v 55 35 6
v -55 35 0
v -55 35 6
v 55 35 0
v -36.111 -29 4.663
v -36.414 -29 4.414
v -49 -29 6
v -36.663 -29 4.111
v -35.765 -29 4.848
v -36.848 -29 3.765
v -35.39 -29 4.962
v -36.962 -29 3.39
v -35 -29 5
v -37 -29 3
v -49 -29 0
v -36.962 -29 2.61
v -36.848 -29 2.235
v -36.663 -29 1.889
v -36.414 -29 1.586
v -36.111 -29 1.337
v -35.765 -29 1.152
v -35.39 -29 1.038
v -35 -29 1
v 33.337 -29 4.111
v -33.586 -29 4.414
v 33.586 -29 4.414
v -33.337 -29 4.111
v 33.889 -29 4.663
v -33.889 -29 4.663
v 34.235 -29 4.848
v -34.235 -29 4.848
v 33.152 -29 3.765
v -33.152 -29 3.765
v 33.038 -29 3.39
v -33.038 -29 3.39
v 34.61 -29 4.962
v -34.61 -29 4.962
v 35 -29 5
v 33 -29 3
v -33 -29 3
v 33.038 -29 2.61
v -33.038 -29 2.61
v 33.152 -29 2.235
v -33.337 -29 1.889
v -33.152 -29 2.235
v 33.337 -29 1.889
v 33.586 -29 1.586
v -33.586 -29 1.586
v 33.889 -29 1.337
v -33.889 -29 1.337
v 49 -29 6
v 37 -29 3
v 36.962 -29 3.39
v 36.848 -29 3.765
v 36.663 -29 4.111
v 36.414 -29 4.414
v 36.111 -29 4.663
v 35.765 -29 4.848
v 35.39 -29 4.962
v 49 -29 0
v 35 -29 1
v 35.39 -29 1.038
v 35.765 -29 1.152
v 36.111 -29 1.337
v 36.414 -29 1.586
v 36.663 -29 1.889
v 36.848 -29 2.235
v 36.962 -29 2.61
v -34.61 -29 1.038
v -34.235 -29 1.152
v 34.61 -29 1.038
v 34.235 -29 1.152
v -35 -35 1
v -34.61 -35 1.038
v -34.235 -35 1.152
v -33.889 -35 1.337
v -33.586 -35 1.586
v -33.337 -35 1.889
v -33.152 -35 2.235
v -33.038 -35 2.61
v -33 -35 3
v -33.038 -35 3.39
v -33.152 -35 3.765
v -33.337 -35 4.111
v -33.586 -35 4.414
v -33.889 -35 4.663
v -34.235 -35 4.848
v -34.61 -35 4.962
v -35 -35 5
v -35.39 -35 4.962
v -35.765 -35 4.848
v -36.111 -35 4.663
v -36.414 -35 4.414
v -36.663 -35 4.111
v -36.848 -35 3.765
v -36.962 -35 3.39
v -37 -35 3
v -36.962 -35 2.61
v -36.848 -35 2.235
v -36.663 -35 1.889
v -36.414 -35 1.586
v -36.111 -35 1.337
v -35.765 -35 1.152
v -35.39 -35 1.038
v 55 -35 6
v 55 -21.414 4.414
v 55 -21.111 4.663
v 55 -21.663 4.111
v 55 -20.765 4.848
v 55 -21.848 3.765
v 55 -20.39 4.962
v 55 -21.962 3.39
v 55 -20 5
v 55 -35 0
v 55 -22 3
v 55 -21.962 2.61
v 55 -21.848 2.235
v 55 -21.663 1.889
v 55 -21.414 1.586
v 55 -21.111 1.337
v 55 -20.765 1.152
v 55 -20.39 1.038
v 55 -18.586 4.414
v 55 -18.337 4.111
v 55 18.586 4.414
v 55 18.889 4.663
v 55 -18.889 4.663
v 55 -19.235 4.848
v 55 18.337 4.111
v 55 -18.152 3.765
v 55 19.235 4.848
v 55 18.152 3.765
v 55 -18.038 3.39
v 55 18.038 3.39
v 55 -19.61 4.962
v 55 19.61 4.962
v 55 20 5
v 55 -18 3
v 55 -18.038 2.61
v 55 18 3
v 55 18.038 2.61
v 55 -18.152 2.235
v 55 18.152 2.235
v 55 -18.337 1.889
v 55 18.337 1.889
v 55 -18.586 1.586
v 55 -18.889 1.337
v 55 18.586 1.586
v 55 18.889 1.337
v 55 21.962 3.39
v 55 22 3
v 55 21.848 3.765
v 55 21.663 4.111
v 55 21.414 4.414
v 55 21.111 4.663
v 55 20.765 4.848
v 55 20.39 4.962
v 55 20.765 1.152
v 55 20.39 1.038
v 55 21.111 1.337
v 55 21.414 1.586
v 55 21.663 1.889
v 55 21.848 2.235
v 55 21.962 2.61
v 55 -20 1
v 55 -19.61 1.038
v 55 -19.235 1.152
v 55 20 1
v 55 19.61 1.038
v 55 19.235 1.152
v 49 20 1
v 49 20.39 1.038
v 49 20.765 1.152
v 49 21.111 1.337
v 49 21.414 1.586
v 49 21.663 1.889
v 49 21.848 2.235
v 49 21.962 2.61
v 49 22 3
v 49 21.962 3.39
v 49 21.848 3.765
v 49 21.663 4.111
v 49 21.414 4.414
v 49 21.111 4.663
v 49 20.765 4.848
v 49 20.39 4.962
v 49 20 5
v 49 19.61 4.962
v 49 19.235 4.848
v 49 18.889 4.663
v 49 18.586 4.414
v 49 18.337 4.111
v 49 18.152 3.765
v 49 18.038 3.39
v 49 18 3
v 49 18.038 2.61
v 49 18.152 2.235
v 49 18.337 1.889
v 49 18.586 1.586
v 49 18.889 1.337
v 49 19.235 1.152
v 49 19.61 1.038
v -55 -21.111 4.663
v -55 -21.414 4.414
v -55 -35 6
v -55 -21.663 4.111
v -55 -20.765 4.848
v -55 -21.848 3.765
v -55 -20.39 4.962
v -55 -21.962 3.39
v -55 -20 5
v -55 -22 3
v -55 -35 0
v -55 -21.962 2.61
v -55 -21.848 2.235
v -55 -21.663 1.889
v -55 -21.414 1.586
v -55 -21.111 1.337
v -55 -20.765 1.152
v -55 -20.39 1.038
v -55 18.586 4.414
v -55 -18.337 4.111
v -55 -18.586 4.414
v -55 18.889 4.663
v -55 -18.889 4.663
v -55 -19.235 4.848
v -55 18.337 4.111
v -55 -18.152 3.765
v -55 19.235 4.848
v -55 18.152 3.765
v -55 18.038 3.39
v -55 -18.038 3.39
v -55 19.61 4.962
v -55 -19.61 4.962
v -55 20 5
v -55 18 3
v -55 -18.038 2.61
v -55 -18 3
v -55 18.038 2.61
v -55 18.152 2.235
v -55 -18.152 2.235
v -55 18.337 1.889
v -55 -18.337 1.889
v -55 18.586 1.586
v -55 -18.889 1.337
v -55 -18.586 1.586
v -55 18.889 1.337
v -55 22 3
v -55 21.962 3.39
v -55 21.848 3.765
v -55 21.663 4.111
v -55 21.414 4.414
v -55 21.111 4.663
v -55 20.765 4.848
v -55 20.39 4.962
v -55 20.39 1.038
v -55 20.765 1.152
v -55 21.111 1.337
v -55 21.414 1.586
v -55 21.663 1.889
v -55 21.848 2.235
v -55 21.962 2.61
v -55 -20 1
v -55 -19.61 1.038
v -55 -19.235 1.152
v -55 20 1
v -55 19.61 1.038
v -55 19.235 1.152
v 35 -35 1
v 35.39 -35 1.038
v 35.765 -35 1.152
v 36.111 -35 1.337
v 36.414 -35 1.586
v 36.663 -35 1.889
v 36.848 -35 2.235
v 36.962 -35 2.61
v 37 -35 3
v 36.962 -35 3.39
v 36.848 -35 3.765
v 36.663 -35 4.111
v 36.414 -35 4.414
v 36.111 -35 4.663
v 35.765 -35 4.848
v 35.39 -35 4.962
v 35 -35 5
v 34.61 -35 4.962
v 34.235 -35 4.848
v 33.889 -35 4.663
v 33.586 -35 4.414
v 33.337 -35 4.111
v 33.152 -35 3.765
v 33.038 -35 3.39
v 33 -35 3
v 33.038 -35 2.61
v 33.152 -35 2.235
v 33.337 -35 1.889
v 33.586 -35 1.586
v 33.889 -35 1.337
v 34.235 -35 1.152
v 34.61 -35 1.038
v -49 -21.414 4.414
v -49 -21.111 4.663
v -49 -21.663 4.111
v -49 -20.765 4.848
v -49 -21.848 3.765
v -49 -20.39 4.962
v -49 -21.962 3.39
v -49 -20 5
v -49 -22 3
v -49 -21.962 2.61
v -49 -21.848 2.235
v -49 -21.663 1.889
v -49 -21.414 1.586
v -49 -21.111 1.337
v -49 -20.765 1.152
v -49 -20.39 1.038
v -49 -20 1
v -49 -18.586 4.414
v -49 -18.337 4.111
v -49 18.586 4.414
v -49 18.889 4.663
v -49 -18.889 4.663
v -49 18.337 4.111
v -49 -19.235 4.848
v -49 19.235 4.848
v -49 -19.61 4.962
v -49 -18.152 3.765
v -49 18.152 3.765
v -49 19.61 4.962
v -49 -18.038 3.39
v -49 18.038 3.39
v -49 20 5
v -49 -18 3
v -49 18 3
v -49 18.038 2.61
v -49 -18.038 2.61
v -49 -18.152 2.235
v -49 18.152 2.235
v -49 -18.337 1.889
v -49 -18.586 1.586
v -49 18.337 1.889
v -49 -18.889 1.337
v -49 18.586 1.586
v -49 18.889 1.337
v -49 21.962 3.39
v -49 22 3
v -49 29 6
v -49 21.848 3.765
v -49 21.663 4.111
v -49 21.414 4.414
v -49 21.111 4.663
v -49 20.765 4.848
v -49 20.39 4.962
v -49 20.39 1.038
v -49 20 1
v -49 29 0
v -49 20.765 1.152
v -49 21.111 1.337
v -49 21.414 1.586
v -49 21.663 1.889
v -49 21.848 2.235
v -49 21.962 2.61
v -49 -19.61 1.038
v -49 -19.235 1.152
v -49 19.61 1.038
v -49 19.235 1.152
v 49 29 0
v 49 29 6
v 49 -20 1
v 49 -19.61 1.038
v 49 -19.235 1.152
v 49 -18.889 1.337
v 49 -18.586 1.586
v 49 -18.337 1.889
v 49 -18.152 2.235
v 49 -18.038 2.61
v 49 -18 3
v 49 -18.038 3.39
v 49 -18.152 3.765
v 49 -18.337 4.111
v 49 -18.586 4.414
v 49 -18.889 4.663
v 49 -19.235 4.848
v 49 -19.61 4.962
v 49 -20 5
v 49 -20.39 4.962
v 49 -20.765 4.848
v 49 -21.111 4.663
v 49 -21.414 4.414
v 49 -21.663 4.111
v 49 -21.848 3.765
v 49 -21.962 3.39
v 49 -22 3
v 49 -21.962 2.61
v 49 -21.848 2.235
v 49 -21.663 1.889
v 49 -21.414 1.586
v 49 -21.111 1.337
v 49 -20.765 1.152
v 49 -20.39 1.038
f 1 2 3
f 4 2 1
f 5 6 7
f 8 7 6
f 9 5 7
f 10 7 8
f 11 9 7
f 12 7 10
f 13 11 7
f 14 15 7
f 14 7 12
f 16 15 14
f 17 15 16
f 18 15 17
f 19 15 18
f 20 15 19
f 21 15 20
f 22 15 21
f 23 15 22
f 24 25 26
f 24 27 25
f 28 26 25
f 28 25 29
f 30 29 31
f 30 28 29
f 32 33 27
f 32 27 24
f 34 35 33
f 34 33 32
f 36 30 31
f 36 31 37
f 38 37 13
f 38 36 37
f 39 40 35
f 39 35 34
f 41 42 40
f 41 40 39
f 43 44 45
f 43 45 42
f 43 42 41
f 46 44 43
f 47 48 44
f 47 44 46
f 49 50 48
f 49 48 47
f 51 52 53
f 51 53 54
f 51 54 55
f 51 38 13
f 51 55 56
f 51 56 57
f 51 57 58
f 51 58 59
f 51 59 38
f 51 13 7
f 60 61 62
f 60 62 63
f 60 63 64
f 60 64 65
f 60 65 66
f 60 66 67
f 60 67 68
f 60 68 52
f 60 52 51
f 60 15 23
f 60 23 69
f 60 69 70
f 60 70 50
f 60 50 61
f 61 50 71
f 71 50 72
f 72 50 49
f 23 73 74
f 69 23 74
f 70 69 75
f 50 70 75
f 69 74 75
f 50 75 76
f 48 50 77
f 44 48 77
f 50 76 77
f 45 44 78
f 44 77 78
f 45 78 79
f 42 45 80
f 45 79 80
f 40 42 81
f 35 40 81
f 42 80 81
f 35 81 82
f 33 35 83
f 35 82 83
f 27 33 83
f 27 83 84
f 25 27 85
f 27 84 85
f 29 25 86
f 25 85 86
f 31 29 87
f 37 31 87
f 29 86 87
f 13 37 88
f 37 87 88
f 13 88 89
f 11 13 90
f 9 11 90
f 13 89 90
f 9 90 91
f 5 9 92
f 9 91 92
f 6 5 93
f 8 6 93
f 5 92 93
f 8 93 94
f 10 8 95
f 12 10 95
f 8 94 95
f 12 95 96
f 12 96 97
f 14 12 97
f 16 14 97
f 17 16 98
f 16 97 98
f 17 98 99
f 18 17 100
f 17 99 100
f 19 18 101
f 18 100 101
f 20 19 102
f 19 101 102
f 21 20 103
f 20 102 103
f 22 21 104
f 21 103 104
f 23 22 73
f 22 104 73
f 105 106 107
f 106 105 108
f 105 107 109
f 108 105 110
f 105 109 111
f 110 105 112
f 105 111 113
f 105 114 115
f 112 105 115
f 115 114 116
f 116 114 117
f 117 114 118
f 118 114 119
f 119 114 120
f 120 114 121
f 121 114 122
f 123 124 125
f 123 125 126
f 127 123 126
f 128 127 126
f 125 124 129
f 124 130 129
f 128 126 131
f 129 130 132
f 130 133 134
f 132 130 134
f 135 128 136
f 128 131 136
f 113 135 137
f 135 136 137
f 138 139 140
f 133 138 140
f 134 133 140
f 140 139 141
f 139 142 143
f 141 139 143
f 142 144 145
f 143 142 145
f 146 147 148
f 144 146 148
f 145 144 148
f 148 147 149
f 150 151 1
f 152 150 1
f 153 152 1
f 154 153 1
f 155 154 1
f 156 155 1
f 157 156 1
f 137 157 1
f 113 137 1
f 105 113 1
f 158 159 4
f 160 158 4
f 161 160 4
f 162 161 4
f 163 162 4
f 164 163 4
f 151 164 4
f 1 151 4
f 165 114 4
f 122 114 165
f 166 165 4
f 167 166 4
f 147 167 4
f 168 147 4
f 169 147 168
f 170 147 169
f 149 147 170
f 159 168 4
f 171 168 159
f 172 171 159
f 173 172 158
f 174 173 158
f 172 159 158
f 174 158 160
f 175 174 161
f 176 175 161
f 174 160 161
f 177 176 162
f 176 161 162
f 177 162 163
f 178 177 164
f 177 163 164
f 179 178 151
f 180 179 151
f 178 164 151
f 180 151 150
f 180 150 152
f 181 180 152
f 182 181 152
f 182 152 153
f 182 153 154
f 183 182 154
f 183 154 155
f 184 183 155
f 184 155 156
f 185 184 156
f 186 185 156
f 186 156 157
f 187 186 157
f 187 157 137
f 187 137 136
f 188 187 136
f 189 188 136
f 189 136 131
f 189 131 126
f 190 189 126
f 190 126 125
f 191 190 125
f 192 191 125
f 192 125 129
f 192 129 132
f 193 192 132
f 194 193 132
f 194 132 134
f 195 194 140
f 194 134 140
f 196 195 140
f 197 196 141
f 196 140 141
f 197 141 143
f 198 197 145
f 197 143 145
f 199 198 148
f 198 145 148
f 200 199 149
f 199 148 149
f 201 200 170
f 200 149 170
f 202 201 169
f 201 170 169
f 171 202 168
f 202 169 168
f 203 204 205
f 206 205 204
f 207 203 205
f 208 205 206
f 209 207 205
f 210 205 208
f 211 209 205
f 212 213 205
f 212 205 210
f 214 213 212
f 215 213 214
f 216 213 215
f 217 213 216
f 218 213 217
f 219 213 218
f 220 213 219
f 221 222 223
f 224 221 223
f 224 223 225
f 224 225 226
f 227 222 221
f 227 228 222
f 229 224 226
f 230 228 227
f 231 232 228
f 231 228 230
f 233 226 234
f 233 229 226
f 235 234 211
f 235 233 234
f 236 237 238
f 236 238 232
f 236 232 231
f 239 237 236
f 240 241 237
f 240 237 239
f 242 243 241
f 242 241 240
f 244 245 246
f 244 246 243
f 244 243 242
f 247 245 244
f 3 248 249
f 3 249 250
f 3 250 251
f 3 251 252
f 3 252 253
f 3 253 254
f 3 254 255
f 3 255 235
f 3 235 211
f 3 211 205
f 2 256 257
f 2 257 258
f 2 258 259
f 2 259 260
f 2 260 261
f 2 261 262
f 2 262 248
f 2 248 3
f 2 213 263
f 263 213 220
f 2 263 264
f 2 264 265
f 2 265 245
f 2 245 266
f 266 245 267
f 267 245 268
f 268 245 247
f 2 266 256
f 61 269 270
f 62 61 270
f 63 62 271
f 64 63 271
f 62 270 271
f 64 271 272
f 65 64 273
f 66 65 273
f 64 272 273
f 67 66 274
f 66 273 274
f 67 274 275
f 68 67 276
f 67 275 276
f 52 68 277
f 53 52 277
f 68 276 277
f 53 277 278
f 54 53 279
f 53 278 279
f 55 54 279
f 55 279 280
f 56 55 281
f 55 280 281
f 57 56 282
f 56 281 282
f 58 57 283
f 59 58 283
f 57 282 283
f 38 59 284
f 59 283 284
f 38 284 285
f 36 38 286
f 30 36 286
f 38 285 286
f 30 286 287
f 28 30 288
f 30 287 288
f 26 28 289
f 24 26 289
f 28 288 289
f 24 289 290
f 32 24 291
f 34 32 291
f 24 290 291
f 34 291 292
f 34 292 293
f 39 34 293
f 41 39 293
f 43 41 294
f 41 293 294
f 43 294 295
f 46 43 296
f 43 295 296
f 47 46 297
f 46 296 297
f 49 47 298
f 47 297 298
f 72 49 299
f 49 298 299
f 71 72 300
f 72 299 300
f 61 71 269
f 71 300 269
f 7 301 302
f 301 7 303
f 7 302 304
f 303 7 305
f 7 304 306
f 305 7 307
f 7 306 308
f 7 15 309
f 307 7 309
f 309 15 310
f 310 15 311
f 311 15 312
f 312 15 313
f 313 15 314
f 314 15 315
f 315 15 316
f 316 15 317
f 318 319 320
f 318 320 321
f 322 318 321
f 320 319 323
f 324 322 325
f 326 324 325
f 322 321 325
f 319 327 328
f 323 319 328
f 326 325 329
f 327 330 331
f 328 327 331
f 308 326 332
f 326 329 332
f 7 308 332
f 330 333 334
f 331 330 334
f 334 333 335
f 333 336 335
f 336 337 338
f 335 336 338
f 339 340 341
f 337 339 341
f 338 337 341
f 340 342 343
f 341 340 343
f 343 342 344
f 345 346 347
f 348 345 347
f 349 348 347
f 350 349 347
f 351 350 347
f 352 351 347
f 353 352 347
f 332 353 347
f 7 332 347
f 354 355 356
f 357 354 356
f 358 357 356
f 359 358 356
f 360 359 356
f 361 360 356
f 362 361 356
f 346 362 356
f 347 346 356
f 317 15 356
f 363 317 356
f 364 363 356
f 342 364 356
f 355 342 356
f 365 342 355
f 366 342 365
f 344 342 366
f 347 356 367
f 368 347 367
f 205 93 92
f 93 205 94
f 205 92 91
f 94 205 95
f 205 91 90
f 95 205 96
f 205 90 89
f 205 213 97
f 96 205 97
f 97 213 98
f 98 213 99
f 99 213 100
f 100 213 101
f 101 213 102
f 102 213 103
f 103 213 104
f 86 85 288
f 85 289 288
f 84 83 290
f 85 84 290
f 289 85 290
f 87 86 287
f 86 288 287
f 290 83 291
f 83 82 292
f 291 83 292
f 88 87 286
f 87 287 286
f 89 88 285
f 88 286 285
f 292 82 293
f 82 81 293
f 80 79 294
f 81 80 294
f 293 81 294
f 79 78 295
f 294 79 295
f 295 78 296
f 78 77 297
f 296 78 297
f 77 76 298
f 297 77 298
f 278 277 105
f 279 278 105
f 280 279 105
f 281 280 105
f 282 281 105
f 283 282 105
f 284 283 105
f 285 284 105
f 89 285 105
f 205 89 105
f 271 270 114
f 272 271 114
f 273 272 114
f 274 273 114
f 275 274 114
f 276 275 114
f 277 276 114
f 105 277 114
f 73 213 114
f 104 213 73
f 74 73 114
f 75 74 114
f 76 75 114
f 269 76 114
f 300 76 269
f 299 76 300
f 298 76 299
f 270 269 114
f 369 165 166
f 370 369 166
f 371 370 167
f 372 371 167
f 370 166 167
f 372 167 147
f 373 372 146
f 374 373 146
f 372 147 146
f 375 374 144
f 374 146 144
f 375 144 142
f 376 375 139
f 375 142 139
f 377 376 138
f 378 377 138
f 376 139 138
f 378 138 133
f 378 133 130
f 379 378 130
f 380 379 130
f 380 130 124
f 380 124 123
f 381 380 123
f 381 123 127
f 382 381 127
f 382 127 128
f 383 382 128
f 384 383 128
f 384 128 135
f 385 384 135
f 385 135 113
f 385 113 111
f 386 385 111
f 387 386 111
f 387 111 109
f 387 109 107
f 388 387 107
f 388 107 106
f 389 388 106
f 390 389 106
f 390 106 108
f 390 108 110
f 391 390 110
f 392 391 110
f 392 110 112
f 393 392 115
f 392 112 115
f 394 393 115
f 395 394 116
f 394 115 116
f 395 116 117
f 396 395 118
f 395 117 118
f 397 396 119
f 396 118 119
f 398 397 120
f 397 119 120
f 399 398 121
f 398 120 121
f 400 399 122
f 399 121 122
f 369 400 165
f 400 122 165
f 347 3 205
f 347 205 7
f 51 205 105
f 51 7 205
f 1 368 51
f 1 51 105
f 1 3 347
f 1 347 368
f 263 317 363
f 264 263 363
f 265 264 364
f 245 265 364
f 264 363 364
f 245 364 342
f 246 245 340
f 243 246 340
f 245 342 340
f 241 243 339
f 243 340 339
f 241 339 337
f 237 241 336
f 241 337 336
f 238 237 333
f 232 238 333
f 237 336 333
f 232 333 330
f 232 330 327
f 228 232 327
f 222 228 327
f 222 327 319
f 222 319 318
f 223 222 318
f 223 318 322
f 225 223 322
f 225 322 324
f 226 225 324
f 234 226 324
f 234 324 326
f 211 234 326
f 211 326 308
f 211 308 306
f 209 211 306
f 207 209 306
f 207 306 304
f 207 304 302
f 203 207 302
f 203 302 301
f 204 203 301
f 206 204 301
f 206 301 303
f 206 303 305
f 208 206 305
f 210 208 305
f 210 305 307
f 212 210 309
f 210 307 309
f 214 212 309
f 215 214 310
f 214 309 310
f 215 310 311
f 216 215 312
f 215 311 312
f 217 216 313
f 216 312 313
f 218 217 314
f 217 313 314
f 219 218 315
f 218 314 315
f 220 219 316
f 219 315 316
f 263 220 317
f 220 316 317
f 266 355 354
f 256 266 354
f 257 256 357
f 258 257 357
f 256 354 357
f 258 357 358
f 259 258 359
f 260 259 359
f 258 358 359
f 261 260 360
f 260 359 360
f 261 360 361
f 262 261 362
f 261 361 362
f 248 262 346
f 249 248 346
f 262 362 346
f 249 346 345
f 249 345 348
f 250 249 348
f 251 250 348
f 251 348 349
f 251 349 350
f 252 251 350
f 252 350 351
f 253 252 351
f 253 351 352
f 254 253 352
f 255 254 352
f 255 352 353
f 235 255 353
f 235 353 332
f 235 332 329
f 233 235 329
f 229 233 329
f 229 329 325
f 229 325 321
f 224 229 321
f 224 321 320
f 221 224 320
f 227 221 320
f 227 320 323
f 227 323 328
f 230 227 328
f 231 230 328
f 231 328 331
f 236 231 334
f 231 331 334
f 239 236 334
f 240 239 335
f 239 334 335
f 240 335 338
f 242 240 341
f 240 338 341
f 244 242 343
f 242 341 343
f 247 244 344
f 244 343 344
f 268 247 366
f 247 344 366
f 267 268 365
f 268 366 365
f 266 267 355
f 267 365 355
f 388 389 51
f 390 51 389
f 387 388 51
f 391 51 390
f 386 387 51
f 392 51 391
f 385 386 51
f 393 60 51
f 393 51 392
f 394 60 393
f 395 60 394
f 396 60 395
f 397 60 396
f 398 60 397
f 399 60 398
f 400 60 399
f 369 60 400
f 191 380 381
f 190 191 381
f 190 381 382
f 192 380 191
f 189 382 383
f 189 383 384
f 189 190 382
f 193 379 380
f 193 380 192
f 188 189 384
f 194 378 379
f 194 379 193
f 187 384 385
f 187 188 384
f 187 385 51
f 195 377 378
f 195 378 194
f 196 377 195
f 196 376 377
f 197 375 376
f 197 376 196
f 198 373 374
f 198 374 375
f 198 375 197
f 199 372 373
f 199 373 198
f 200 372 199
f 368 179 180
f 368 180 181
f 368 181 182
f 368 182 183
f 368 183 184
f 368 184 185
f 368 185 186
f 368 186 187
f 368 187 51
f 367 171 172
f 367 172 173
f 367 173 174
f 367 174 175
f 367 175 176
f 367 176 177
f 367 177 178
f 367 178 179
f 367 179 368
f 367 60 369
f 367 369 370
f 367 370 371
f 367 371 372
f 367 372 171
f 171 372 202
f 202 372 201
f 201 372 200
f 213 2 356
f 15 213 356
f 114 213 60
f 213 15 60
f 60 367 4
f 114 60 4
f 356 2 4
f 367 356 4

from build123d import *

# Parameters (mm, degrees)
SKETCH_1_W          = 110
SKETCH_1_H          = 70
SKETCH_1_W_2        = 98
SKETCH_1_H_2        = 58
EXTRUDE_1_DEPTH     = 6
SKETCH_3_R          = 2
CUT_EXTRUDE_2_DEPTH = 6
SKETCH_4_R          = 2
CUT_EXTRUDE_3_DEPTH = 110


with BuildPart() as part:
    # 草图1 → 凸台-拉伸1 (new body)
    with BuildSketch(Plane.XY):
        Rectangle(SKETCH_1_W, SKETCH_1_H)
        Rectangle(SKETCH_1_W_2, SKETCH_1_H_2, mode=Mode.SUBTRACT)
    extrude(amount=EXTRUDE_1_DEPTH)

    # 草图3 → 切除-拉伸2 (cut)
    with BuildSketch(Plane.XZ.offset(35)):
        with Locations(Location((-35, 3, 0), (0, 0, 270))):
            Circle(SKETCH_3_R)
        with Locations(Location((35, 3, 0), (0, 0, 270))):
            Circle(SKETCH_3_R)
    extrude(amount=-CUT_EXTRUDE_2_DEPTH, mode=Mode.SUBTRACT)

    # 草图4 → 切除-拉伸3 (cut)
    with BuildSketch(Plane(origin=(55, 0, 0), x_dir=(0, 0, -1), z_dir=(1, 0, 0))):
        with Locations((-3, 20)):
            Circle(SKETCH_4_R)
        with Locations((-3, -20)):
            Circle(SKETCH_4_R)
    extrude(amount=-CUT_EXTRUDE_3_DEPTH, mode=Mode.SUBTRACT)


solid = part.part
